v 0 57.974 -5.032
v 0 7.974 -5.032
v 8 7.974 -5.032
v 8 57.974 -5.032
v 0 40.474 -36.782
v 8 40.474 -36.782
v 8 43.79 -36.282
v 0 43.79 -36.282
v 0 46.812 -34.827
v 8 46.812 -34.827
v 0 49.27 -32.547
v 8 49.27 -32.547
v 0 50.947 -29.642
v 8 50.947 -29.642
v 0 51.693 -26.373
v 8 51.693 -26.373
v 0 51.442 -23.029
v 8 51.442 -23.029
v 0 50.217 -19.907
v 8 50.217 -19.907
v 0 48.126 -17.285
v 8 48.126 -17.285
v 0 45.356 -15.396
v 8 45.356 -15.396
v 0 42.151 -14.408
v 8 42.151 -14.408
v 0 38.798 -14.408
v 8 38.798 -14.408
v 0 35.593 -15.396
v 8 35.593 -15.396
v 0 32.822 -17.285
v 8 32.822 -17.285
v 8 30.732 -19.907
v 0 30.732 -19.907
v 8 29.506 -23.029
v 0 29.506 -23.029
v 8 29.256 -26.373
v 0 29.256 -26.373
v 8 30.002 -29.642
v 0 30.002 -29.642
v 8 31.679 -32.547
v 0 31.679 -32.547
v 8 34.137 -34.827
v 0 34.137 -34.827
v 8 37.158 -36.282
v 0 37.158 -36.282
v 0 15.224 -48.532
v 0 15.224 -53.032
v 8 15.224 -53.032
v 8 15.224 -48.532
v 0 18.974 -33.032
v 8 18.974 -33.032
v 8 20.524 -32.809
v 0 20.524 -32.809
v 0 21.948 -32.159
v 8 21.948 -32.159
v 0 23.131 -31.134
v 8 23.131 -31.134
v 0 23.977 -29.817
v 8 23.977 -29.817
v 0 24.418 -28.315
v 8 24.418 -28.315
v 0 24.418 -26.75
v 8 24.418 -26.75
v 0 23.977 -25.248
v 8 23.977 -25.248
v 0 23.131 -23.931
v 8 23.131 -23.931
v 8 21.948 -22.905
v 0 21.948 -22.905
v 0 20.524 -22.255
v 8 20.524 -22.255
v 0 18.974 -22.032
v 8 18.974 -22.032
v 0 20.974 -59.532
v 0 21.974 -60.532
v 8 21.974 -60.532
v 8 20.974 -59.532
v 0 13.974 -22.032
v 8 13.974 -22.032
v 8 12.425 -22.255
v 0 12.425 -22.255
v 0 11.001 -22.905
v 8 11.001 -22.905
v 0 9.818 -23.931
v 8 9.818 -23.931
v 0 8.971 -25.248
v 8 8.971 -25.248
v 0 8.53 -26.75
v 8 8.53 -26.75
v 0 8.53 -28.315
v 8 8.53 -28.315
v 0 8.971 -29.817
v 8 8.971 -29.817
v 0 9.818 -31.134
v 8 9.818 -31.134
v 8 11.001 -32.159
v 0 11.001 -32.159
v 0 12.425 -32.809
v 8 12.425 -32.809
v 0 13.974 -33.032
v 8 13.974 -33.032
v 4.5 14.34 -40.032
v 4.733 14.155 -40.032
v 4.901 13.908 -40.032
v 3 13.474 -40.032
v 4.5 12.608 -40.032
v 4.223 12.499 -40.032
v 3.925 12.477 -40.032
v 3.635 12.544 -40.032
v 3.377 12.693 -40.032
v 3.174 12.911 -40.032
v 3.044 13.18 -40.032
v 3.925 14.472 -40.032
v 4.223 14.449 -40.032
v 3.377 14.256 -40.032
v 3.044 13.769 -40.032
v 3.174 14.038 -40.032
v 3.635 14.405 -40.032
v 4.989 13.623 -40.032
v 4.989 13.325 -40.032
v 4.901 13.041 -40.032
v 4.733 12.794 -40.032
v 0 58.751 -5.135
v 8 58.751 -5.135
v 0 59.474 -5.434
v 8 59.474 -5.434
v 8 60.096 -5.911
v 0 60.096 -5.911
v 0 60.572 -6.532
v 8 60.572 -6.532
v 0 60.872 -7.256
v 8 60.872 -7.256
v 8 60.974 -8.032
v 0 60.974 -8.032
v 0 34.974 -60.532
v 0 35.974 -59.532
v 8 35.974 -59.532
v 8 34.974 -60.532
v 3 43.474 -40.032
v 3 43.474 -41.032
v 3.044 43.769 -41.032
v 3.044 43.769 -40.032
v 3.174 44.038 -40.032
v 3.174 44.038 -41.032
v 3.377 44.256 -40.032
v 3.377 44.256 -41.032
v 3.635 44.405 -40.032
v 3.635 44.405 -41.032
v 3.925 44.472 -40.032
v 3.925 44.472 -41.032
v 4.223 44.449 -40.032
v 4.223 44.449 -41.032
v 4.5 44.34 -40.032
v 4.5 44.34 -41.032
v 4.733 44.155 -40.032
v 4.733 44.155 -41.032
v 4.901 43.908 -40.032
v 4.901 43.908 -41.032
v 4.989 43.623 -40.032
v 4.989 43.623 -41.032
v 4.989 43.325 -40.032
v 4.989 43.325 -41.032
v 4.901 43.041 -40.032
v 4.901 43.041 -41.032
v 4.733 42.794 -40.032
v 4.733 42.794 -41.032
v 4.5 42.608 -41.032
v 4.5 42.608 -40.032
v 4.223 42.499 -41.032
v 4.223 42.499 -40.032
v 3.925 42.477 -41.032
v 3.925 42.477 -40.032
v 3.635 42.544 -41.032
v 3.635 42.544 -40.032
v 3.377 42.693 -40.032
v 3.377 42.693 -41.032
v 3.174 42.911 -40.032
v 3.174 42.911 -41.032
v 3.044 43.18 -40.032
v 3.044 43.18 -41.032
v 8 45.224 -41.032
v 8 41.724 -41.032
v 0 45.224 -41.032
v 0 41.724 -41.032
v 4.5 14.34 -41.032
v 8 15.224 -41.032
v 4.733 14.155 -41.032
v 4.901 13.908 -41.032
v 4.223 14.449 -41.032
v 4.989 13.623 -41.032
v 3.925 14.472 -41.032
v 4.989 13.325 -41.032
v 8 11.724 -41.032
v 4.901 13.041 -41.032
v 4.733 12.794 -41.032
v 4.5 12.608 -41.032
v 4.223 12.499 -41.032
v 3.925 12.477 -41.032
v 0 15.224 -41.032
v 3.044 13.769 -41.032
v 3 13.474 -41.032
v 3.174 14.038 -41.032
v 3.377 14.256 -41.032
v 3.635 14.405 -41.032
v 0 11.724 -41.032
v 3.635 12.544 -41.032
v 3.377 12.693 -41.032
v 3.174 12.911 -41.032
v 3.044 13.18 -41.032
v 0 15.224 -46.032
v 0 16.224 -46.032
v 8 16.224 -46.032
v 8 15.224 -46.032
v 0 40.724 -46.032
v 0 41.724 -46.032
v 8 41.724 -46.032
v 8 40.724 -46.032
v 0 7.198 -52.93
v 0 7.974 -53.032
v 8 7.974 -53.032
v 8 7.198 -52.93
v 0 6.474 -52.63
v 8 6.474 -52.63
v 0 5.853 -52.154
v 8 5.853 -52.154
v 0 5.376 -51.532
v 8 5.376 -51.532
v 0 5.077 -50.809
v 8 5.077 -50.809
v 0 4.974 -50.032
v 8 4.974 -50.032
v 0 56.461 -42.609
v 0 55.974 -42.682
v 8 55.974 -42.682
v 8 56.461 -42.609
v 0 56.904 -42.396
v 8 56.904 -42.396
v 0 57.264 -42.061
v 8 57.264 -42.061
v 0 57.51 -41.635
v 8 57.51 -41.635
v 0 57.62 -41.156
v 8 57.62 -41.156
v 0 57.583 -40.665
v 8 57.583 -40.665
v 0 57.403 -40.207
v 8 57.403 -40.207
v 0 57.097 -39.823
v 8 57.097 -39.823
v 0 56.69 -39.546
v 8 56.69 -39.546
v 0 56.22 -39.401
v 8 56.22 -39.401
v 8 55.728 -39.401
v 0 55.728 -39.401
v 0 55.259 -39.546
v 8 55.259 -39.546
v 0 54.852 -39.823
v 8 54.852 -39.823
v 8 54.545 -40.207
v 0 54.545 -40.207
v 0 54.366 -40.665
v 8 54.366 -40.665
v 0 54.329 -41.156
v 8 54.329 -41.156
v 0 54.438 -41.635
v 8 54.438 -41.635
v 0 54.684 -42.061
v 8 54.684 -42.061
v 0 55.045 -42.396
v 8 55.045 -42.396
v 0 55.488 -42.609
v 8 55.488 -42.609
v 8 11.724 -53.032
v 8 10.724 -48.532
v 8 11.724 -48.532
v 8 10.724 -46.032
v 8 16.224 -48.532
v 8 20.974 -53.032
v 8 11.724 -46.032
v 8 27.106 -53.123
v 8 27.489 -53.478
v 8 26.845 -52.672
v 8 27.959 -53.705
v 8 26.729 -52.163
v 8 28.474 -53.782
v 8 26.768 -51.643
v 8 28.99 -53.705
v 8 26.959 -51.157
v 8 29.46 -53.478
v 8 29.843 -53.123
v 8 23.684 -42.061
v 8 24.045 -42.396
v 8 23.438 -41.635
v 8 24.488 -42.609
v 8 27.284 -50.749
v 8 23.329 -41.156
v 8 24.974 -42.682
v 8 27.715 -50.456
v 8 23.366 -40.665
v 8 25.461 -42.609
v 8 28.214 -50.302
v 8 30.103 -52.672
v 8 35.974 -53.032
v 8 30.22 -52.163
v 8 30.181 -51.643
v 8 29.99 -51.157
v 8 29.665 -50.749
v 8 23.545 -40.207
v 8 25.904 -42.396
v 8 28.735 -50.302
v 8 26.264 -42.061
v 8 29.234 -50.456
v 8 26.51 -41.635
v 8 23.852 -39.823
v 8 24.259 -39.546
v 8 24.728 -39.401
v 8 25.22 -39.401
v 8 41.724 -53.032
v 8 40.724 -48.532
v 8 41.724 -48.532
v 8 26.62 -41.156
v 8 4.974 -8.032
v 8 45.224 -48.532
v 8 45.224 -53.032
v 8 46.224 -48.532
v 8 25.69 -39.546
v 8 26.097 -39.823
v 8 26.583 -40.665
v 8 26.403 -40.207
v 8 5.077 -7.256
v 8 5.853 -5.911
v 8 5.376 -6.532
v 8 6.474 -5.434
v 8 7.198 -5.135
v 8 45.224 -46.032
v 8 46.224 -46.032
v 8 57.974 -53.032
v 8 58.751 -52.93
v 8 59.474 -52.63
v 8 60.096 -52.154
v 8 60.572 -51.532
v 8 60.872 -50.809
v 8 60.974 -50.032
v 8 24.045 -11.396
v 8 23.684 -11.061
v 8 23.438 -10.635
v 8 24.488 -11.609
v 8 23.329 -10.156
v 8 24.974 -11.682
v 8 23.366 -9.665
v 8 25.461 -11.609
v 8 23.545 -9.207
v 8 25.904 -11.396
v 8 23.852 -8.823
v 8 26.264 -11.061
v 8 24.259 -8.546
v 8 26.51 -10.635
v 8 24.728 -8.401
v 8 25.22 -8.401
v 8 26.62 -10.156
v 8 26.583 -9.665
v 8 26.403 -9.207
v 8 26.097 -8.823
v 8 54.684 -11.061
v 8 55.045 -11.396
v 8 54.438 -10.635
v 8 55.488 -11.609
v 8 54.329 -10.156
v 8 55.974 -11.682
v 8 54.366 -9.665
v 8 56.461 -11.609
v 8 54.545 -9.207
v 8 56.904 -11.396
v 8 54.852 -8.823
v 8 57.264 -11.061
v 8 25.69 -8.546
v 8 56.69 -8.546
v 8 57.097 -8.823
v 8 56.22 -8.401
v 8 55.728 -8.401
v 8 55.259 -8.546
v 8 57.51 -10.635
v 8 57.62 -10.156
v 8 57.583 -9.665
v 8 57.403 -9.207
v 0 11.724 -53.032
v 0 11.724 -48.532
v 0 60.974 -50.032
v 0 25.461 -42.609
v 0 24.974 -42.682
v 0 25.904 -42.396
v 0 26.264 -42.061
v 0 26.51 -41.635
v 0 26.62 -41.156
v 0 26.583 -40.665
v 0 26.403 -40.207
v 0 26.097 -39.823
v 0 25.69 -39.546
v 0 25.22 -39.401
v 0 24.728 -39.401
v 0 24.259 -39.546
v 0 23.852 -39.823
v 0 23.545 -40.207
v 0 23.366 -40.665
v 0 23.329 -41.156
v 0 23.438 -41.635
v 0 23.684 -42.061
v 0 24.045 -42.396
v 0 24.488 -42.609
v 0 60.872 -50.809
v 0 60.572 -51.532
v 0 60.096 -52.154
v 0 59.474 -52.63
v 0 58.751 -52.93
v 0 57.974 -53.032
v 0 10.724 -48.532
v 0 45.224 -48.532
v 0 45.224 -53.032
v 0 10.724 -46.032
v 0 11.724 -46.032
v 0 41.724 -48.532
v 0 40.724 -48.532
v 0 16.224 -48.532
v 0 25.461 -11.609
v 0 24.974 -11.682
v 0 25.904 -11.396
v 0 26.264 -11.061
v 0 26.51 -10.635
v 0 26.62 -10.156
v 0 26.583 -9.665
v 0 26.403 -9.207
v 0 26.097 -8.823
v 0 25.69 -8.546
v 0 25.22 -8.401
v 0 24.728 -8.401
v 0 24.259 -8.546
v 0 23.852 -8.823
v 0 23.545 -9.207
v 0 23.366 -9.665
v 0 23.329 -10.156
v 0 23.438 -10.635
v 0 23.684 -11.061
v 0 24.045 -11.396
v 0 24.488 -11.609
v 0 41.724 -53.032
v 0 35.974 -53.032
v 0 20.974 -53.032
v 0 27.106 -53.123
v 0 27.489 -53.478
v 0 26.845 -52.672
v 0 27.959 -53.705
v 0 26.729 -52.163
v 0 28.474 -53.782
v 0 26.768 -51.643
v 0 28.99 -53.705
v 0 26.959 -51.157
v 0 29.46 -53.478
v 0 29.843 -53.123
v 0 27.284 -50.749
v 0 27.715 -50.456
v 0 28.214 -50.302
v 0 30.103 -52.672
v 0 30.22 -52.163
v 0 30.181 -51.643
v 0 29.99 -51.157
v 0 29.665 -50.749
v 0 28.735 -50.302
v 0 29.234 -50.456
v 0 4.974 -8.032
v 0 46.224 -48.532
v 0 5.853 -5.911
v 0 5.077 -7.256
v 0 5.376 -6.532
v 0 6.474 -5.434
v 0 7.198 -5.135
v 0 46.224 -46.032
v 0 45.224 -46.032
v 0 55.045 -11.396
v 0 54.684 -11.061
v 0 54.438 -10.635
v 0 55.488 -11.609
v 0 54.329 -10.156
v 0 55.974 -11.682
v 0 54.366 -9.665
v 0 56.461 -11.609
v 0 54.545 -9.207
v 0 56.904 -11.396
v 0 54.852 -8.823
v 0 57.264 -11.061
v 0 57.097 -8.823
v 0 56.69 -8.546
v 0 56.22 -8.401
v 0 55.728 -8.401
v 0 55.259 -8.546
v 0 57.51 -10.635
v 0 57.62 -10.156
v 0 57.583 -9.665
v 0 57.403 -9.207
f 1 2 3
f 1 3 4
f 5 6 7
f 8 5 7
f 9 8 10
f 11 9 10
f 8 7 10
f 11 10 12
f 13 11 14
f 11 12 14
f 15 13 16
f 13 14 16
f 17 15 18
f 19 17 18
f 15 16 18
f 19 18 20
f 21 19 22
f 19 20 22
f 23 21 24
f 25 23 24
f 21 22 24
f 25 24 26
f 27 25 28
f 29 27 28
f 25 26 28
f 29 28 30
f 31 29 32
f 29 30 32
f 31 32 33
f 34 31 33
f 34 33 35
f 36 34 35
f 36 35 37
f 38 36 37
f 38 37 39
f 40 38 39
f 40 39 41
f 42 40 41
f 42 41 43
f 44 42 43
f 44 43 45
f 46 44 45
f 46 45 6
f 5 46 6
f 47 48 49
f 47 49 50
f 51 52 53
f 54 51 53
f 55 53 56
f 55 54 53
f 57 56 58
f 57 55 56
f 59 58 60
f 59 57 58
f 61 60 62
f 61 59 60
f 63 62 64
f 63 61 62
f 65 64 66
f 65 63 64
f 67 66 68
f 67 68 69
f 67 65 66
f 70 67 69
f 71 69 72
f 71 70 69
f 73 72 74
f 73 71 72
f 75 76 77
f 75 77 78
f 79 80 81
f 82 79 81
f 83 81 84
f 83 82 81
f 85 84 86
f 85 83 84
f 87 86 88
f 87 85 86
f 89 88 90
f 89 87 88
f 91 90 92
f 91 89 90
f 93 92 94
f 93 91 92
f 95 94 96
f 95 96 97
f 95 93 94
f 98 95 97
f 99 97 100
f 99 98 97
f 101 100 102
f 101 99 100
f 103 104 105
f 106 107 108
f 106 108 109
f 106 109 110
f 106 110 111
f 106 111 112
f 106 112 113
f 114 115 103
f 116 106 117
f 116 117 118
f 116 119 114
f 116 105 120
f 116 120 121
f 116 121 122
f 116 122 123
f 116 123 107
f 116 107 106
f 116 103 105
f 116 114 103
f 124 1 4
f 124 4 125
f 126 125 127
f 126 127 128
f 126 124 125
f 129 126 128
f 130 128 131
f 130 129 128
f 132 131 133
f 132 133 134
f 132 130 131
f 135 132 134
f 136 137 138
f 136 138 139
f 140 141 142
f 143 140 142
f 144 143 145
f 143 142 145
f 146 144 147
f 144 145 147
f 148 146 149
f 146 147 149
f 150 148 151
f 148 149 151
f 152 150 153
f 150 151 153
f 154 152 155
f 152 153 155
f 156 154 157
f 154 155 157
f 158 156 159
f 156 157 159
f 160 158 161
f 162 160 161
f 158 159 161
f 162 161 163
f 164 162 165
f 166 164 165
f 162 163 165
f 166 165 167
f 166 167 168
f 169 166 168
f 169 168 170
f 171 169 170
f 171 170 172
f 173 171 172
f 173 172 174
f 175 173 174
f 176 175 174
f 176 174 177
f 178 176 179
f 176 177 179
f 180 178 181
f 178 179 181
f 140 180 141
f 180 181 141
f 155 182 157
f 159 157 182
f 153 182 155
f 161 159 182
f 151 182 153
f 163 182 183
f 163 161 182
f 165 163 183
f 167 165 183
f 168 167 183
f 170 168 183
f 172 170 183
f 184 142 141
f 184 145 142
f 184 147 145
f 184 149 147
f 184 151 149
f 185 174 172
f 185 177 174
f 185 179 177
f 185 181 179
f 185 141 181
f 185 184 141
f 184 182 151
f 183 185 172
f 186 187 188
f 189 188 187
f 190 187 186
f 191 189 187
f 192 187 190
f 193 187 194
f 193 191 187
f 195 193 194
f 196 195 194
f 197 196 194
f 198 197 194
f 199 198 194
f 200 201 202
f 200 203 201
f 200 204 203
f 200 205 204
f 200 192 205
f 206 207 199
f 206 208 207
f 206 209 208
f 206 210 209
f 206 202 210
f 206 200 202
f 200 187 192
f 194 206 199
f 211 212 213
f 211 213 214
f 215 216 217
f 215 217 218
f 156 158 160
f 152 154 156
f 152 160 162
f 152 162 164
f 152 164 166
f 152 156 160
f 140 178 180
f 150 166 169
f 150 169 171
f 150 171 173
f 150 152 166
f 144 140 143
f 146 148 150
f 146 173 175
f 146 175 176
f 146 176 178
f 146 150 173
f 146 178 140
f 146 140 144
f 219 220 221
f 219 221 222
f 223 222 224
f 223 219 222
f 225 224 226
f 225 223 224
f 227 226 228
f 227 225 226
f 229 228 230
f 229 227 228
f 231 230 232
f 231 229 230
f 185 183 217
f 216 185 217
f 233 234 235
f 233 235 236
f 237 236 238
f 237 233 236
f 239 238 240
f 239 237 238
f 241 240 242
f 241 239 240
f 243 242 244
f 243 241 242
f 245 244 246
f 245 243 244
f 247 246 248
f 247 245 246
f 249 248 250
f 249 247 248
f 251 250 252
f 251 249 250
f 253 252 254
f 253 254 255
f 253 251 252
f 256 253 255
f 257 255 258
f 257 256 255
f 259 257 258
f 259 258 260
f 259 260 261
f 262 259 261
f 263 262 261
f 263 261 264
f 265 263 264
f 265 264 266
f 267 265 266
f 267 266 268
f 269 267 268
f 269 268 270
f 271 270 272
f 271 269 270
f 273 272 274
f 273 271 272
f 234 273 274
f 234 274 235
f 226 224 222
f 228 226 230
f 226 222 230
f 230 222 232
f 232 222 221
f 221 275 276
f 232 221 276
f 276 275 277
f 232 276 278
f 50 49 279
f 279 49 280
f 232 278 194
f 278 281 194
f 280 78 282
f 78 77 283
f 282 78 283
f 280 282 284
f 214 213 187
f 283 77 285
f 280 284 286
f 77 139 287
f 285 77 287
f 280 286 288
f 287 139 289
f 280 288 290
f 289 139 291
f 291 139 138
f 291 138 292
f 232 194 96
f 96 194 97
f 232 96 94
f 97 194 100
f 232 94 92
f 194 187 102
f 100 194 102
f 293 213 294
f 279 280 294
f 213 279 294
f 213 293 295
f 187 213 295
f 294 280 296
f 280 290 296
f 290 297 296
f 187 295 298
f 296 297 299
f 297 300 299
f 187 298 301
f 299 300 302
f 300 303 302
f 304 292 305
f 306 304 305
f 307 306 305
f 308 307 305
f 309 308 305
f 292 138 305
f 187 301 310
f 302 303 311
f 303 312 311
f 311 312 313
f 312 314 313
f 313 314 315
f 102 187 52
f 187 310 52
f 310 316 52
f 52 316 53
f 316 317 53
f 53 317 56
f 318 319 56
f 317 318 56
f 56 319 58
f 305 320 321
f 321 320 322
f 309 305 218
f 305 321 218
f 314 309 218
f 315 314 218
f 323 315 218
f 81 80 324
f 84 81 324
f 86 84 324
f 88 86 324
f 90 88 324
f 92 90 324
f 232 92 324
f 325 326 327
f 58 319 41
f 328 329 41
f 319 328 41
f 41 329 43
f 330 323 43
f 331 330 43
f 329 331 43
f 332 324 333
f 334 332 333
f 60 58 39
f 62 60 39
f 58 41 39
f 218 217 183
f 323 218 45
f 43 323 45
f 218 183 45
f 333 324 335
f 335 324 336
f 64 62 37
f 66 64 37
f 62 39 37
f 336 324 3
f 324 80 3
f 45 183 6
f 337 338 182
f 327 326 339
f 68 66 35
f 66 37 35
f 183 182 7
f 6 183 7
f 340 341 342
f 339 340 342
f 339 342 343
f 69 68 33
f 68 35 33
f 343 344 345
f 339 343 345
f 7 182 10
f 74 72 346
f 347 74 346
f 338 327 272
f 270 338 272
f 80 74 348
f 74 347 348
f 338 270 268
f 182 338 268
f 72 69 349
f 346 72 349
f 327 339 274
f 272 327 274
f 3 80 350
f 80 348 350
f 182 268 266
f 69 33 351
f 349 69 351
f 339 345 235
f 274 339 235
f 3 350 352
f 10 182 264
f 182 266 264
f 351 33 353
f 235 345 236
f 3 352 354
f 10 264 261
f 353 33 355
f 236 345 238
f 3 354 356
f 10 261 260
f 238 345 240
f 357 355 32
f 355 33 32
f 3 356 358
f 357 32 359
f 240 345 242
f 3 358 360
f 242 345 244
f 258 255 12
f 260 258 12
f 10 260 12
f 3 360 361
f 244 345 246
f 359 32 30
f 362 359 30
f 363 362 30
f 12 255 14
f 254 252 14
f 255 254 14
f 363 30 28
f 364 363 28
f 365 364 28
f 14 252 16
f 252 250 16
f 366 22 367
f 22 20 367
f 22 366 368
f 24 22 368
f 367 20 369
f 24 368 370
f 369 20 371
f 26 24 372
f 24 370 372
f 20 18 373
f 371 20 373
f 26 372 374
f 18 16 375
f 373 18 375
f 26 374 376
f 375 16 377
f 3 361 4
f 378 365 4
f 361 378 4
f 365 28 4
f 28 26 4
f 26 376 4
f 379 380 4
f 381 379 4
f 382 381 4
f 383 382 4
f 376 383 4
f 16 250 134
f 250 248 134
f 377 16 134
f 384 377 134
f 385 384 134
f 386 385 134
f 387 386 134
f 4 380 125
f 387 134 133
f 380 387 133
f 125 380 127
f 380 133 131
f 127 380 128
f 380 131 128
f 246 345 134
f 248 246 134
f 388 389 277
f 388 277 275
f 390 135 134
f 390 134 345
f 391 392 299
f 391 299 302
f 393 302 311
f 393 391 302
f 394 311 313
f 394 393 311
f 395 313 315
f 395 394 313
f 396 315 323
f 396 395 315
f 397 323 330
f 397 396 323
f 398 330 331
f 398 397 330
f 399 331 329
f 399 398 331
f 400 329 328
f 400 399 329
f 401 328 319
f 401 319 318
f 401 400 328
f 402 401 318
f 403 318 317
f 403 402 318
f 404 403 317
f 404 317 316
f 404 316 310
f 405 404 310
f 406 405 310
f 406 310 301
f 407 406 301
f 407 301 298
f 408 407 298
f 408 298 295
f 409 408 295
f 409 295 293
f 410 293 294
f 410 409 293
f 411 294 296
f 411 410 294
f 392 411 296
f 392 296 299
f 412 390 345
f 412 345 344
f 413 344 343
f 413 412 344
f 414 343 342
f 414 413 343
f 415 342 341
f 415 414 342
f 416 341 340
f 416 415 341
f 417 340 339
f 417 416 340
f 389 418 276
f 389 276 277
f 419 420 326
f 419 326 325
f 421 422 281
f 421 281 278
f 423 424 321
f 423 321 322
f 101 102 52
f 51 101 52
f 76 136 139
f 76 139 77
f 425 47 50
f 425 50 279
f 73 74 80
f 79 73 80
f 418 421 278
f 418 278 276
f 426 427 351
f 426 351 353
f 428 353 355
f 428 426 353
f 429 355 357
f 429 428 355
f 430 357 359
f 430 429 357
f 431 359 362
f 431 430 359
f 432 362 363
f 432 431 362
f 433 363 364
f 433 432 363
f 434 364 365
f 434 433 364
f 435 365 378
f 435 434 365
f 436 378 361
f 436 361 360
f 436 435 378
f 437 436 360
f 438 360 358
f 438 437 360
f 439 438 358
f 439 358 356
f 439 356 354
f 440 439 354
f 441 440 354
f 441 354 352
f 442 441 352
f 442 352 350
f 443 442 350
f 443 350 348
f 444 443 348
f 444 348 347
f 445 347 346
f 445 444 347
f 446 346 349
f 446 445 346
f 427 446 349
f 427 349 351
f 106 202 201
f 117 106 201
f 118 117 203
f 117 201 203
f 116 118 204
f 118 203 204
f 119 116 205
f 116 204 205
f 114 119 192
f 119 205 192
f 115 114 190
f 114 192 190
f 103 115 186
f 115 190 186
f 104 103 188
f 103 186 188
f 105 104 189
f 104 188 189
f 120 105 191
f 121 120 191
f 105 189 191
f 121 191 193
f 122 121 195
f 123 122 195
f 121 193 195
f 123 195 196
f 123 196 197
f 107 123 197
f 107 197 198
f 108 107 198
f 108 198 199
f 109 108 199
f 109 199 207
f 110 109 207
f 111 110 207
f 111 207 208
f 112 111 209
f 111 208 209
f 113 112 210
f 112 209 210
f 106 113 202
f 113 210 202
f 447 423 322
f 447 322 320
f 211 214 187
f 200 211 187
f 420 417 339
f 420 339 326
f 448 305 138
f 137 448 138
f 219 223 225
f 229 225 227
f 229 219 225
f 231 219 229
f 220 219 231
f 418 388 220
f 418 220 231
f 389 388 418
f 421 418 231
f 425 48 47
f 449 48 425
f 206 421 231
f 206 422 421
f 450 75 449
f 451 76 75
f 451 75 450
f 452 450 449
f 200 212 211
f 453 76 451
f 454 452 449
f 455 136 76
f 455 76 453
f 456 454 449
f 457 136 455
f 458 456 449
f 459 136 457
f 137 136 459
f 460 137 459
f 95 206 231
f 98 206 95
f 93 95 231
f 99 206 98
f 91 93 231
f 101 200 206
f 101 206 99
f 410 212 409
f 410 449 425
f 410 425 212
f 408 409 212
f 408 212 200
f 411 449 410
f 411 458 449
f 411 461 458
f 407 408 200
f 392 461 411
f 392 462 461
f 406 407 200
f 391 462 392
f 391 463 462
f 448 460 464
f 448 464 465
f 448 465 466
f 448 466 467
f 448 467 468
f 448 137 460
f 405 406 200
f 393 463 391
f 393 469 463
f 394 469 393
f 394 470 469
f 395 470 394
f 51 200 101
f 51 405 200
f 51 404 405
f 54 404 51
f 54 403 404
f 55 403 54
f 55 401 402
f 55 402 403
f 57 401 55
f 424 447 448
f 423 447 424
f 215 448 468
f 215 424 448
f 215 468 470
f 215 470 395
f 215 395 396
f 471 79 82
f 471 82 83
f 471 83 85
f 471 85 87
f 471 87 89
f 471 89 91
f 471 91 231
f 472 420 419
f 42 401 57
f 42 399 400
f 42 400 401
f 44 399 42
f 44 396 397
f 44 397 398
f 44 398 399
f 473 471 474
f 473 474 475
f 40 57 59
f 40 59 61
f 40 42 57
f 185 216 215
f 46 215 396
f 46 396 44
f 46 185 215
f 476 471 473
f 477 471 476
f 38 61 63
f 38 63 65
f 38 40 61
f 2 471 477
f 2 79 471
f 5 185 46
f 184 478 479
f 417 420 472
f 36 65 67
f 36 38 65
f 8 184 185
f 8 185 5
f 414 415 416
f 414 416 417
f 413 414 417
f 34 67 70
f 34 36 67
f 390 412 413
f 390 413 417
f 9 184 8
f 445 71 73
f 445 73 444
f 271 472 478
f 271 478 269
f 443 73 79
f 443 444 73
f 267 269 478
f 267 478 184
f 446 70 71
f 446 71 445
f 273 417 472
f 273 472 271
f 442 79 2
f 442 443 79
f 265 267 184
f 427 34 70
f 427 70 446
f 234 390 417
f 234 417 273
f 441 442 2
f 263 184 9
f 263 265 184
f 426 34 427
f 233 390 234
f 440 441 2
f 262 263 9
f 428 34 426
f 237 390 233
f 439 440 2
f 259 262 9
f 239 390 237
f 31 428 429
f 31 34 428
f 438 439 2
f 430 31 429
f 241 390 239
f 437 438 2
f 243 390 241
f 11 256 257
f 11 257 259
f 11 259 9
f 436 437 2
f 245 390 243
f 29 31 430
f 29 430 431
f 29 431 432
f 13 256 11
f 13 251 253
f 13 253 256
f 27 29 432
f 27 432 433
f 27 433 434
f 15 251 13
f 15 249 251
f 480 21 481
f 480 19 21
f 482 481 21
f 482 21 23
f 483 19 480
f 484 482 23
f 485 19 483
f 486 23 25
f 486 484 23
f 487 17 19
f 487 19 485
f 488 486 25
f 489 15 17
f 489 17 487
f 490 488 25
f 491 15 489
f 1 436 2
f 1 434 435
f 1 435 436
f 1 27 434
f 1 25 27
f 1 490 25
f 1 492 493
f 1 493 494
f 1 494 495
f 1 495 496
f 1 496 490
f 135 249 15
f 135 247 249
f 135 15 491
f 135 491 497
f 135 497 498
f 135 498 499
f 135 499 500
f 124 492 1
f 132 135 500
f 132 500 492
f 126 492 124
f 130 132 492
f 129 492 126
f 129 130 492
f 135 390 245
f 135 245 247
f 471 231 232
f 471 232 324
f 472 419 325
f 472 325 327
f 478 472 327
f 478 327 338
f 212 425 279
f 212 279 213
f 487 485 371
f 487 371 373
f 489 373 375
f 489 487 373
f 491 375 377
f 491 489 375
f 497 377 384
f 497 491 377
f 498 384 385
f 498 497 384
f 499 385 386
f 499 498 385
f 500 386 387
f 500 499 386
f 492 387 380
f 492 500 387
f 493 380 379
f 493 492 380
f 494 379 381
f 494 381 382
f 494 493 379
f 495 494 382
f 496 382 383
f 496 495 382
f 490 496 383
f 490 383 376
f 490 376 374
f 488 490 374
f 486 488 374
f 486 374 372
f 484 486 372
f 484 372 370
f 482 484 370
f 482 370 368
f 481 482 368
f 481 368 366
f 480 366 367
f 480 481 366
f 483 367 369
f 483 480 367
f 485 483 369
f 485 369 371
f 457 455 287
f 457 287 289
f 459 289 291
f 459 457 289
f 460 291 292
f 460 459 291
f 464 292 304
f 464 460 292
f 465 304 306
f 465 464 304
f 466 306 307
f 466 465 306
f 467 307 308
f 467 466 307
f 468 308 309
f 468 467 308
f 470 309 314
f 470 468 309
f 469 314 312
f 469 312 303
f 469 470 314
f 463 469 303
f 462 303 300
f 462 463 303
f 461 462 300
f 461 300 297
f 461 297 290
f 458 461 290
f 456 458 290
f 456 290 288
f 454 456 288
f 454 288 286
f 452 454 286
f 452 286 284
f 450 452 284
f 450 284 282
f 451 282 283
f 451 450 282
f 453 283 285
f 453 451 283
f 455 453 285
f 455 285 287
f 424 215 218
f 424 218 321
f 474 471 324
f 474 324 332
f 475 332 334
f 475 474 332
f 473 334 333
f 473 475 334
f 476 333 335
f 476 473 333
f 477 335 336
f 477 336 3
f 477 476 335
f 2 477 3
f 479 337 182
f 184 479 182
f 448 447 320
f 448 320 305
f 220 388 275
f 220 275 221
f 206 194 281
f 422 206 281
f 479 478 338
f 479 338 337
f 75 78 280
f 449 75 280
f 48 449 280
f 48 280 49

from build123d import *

# Parameters (mm, degrees)
SKETCH1_R      = 1.65
SKETCH1_R_2    = 1.75
EXTRUDE1_DEPTH = 8
SKETCH2_R      = 1
EXTRUDE2_DEPTH = 1
SKETCH3_R      = 1
EXTRUDE3_DEPTH = 1
SKETCH4_R      = 11.25
EXTRUDE4_DEPTH = 10


with BuildPart() as part:
    # Sketch1 → Extrude1 (new body)
    with BuildSketch(Plane(origin=(0, 0, 0), x_dir=(0, 0, -1), z_dir=(1, 0, 0))):
        with BuildLine():
            Line((53.032288553, 11.724414772), (53.032288553, 7.974414772))
            ThreePointArc((53.032288553, 7.974414772), (52.153608896, 5.853094429), (50.032288553, 4.974414772))
            Line((50.032288553, 4.974414772), (8.032288553, 4.974414772))
            ThreePointArc((8.032288553, 4.974414772), (5.910968209, 5.853094429), (5.032288553, 7.974414772))
            Line((5.032288553, 7.974414772), (5.032288553, 57.974414772))
            ThreePointArc((5.032288553, 57.974414772), (5.910968209, 60.095735116), (8.032288553, 60.974414772))
            Line((8.032288553, 60.974414772), (50.032288553, 60.974414772))
            ThreePointArc((50.032288553, 60.974414772), (52.153608896, 60.095735116), (53.032288553, 57.974414772))
            Line((53.032288553, 57.974414772), (53.032288553, 45.224414772))
            Line((53.032288553, 45.224414772), (48.532288553, 45.224414772))
            Line((48.532288553, 45.224414772), (48.532288553, 46.224414772))
            Line((48.532288553, 46.224414772), (46.032288553, 46.224414772))
            Line((46.032288553, 46.224414772), (46.032288553, 45.224414772))
            Line((46.032288553, 45.224414772), (41.032288553, 45.224414772))
            Line((41.032288553, 45.224414772), (41.032288553, 41.724414772))
            Line((41.032288553, 41.724414772), (46.032288553, 41.724414772))
            Line((46.032288553, 41.724414772), (46.032288553, 40.724414772))
            Line((46.032288553, 40.724414772), (48.532288553, 40.724414772))
            Line((48.532288553, 40.724414772), (48.532288553, 41.724414772))
            Line((48.532288553, 41.724414772), (53.032288553, 41.724414772))
            Line((53.032288553, 41.724414772), (53.032288553, 35.974414772))
            Line((53.032288553, 35.974414772), (59.532288553, 35.974414772))
            Line((59.532288553, 35.974414772), (60.532288553, 34.974414772))
            Line((60.532288553, 34.974414772), (60.532288553, 21.974414772))
            Line((60.532288553, 21.974414772), (59.532288553, 20.974414772))
            Line((59.532288553, 20.974414772), (53.032288553, 20.974414772))
            Line((53.032288553, 20.974414772), (53.032288553, 15.224414772))
            Line((53.032288553, 15.224414772), (48.532288553, 15.224414772))
            Line((48.532288553, 15.224414772), (48.532288553, 16.224414772))
            Line((48.532288553, 16.224414772), (46.032288553, 16.224414772))
            Line((46.032288553, 16.224414772), (46.032288553, 15.224414772))
            Line((46.032288553, 15.224414772), (41.032288553, 15.224414772))
            Line((41.032288553, 15.224414772), (41.032288553, 11.724414772))
            Line((41.032288553, 11.724414772), (46.032288553, 11.724414772))
            Line((46.032288553, 11.724414772), (46.032288553, 10.724414772))
            Line((46.032288553, 10.724414772), (48.532288553, 10.724414772))
            Line((48.532288553, 10.724414772), (48.532288553, 11.724414772))
            Line((48.532288553, 11.724414772), (53.032288553, 11.724414772))
        make_face()
        with Locations((41.032288553, 55.974414772)):
            Circle(SKETCH1_R, mode=Mode.SUBTRACT)
        with Locations((10.032288553, 55.974414772)):
            Circle(SKETCH1_R, mode=Mode.SUBTRACT)
        with Locations((41.032288553, 24.974414772)):
            Circle(SKETCH1_R, mode=Mode.SUBTRACT)
        with Locations((10.032288553, 24.974414772)):
            Circle(SKETCH1_R, mode=Mode.SUBTRACT)
        with Locations((52.032288553, 28.474414772)):
            Circle(SKETCH1_R_2, mode=Mode.SUBTRACT)
        with BuildLine():
            Line((22.032288553, 18.974414772), (22.032288553, 13.974414772))
            ThreePointArc((22.032288553, 13.974414772), (27.532288553, 8.474414772), (33.032288553, 13.974414772))
            Line((33.032288553, 13.974414772), (33.032288553, 18.974414772))
            ThreePointArc((33.032288553, 18.974414772), (27.532288553, 24.474414772), (22.032288553, 18.974414772))
        make_face(mode=Mode.SUBTRACT)
    extrude(amount=EXTRUDE1_DEPTH)

    # Sketch2 → Extrude2 (cut)
    with BuildSketch(Plane(origin=(0, 0, -41.032288553), x_dir=(-1, 0, 0), z_dir=(0, 0, -1))):
        with Locations((-4, 43.474414772)):
            Circle(SKETCH2_R)
    extrude(amount=-EXTRUDE2_DEPTH, mode=Mode.SUBTRACT)

    # Sketch3 → Extrude3 (cut)
    with BuildSketch(Plane(origin=(0, 0, -41.032288553), x_dir=(-1, 0, 0), z_dir=(0, 0, -1))):
        with Locations((-4, 13.474414772)):
            Circle(SKETCH3_R)
    extrude(amount=-EXTRUDE3_DEPTH, mode=Mode.SUBTRACT)

    # Sketch4 → Extrude4 (cut)
    with BuildSketch(Plane(origin=(8, 0, 0), x_dir=(0, 0, -1), z_dir=(1, 0, 0))):
        with Locations((25.532288553, 40.474414772)):
            Circle(SKETCH4_R)
    extrude(amount=-EXTRUDE4_DEPTH, mode=Mode.SUBTRACT)


solid = part.part
